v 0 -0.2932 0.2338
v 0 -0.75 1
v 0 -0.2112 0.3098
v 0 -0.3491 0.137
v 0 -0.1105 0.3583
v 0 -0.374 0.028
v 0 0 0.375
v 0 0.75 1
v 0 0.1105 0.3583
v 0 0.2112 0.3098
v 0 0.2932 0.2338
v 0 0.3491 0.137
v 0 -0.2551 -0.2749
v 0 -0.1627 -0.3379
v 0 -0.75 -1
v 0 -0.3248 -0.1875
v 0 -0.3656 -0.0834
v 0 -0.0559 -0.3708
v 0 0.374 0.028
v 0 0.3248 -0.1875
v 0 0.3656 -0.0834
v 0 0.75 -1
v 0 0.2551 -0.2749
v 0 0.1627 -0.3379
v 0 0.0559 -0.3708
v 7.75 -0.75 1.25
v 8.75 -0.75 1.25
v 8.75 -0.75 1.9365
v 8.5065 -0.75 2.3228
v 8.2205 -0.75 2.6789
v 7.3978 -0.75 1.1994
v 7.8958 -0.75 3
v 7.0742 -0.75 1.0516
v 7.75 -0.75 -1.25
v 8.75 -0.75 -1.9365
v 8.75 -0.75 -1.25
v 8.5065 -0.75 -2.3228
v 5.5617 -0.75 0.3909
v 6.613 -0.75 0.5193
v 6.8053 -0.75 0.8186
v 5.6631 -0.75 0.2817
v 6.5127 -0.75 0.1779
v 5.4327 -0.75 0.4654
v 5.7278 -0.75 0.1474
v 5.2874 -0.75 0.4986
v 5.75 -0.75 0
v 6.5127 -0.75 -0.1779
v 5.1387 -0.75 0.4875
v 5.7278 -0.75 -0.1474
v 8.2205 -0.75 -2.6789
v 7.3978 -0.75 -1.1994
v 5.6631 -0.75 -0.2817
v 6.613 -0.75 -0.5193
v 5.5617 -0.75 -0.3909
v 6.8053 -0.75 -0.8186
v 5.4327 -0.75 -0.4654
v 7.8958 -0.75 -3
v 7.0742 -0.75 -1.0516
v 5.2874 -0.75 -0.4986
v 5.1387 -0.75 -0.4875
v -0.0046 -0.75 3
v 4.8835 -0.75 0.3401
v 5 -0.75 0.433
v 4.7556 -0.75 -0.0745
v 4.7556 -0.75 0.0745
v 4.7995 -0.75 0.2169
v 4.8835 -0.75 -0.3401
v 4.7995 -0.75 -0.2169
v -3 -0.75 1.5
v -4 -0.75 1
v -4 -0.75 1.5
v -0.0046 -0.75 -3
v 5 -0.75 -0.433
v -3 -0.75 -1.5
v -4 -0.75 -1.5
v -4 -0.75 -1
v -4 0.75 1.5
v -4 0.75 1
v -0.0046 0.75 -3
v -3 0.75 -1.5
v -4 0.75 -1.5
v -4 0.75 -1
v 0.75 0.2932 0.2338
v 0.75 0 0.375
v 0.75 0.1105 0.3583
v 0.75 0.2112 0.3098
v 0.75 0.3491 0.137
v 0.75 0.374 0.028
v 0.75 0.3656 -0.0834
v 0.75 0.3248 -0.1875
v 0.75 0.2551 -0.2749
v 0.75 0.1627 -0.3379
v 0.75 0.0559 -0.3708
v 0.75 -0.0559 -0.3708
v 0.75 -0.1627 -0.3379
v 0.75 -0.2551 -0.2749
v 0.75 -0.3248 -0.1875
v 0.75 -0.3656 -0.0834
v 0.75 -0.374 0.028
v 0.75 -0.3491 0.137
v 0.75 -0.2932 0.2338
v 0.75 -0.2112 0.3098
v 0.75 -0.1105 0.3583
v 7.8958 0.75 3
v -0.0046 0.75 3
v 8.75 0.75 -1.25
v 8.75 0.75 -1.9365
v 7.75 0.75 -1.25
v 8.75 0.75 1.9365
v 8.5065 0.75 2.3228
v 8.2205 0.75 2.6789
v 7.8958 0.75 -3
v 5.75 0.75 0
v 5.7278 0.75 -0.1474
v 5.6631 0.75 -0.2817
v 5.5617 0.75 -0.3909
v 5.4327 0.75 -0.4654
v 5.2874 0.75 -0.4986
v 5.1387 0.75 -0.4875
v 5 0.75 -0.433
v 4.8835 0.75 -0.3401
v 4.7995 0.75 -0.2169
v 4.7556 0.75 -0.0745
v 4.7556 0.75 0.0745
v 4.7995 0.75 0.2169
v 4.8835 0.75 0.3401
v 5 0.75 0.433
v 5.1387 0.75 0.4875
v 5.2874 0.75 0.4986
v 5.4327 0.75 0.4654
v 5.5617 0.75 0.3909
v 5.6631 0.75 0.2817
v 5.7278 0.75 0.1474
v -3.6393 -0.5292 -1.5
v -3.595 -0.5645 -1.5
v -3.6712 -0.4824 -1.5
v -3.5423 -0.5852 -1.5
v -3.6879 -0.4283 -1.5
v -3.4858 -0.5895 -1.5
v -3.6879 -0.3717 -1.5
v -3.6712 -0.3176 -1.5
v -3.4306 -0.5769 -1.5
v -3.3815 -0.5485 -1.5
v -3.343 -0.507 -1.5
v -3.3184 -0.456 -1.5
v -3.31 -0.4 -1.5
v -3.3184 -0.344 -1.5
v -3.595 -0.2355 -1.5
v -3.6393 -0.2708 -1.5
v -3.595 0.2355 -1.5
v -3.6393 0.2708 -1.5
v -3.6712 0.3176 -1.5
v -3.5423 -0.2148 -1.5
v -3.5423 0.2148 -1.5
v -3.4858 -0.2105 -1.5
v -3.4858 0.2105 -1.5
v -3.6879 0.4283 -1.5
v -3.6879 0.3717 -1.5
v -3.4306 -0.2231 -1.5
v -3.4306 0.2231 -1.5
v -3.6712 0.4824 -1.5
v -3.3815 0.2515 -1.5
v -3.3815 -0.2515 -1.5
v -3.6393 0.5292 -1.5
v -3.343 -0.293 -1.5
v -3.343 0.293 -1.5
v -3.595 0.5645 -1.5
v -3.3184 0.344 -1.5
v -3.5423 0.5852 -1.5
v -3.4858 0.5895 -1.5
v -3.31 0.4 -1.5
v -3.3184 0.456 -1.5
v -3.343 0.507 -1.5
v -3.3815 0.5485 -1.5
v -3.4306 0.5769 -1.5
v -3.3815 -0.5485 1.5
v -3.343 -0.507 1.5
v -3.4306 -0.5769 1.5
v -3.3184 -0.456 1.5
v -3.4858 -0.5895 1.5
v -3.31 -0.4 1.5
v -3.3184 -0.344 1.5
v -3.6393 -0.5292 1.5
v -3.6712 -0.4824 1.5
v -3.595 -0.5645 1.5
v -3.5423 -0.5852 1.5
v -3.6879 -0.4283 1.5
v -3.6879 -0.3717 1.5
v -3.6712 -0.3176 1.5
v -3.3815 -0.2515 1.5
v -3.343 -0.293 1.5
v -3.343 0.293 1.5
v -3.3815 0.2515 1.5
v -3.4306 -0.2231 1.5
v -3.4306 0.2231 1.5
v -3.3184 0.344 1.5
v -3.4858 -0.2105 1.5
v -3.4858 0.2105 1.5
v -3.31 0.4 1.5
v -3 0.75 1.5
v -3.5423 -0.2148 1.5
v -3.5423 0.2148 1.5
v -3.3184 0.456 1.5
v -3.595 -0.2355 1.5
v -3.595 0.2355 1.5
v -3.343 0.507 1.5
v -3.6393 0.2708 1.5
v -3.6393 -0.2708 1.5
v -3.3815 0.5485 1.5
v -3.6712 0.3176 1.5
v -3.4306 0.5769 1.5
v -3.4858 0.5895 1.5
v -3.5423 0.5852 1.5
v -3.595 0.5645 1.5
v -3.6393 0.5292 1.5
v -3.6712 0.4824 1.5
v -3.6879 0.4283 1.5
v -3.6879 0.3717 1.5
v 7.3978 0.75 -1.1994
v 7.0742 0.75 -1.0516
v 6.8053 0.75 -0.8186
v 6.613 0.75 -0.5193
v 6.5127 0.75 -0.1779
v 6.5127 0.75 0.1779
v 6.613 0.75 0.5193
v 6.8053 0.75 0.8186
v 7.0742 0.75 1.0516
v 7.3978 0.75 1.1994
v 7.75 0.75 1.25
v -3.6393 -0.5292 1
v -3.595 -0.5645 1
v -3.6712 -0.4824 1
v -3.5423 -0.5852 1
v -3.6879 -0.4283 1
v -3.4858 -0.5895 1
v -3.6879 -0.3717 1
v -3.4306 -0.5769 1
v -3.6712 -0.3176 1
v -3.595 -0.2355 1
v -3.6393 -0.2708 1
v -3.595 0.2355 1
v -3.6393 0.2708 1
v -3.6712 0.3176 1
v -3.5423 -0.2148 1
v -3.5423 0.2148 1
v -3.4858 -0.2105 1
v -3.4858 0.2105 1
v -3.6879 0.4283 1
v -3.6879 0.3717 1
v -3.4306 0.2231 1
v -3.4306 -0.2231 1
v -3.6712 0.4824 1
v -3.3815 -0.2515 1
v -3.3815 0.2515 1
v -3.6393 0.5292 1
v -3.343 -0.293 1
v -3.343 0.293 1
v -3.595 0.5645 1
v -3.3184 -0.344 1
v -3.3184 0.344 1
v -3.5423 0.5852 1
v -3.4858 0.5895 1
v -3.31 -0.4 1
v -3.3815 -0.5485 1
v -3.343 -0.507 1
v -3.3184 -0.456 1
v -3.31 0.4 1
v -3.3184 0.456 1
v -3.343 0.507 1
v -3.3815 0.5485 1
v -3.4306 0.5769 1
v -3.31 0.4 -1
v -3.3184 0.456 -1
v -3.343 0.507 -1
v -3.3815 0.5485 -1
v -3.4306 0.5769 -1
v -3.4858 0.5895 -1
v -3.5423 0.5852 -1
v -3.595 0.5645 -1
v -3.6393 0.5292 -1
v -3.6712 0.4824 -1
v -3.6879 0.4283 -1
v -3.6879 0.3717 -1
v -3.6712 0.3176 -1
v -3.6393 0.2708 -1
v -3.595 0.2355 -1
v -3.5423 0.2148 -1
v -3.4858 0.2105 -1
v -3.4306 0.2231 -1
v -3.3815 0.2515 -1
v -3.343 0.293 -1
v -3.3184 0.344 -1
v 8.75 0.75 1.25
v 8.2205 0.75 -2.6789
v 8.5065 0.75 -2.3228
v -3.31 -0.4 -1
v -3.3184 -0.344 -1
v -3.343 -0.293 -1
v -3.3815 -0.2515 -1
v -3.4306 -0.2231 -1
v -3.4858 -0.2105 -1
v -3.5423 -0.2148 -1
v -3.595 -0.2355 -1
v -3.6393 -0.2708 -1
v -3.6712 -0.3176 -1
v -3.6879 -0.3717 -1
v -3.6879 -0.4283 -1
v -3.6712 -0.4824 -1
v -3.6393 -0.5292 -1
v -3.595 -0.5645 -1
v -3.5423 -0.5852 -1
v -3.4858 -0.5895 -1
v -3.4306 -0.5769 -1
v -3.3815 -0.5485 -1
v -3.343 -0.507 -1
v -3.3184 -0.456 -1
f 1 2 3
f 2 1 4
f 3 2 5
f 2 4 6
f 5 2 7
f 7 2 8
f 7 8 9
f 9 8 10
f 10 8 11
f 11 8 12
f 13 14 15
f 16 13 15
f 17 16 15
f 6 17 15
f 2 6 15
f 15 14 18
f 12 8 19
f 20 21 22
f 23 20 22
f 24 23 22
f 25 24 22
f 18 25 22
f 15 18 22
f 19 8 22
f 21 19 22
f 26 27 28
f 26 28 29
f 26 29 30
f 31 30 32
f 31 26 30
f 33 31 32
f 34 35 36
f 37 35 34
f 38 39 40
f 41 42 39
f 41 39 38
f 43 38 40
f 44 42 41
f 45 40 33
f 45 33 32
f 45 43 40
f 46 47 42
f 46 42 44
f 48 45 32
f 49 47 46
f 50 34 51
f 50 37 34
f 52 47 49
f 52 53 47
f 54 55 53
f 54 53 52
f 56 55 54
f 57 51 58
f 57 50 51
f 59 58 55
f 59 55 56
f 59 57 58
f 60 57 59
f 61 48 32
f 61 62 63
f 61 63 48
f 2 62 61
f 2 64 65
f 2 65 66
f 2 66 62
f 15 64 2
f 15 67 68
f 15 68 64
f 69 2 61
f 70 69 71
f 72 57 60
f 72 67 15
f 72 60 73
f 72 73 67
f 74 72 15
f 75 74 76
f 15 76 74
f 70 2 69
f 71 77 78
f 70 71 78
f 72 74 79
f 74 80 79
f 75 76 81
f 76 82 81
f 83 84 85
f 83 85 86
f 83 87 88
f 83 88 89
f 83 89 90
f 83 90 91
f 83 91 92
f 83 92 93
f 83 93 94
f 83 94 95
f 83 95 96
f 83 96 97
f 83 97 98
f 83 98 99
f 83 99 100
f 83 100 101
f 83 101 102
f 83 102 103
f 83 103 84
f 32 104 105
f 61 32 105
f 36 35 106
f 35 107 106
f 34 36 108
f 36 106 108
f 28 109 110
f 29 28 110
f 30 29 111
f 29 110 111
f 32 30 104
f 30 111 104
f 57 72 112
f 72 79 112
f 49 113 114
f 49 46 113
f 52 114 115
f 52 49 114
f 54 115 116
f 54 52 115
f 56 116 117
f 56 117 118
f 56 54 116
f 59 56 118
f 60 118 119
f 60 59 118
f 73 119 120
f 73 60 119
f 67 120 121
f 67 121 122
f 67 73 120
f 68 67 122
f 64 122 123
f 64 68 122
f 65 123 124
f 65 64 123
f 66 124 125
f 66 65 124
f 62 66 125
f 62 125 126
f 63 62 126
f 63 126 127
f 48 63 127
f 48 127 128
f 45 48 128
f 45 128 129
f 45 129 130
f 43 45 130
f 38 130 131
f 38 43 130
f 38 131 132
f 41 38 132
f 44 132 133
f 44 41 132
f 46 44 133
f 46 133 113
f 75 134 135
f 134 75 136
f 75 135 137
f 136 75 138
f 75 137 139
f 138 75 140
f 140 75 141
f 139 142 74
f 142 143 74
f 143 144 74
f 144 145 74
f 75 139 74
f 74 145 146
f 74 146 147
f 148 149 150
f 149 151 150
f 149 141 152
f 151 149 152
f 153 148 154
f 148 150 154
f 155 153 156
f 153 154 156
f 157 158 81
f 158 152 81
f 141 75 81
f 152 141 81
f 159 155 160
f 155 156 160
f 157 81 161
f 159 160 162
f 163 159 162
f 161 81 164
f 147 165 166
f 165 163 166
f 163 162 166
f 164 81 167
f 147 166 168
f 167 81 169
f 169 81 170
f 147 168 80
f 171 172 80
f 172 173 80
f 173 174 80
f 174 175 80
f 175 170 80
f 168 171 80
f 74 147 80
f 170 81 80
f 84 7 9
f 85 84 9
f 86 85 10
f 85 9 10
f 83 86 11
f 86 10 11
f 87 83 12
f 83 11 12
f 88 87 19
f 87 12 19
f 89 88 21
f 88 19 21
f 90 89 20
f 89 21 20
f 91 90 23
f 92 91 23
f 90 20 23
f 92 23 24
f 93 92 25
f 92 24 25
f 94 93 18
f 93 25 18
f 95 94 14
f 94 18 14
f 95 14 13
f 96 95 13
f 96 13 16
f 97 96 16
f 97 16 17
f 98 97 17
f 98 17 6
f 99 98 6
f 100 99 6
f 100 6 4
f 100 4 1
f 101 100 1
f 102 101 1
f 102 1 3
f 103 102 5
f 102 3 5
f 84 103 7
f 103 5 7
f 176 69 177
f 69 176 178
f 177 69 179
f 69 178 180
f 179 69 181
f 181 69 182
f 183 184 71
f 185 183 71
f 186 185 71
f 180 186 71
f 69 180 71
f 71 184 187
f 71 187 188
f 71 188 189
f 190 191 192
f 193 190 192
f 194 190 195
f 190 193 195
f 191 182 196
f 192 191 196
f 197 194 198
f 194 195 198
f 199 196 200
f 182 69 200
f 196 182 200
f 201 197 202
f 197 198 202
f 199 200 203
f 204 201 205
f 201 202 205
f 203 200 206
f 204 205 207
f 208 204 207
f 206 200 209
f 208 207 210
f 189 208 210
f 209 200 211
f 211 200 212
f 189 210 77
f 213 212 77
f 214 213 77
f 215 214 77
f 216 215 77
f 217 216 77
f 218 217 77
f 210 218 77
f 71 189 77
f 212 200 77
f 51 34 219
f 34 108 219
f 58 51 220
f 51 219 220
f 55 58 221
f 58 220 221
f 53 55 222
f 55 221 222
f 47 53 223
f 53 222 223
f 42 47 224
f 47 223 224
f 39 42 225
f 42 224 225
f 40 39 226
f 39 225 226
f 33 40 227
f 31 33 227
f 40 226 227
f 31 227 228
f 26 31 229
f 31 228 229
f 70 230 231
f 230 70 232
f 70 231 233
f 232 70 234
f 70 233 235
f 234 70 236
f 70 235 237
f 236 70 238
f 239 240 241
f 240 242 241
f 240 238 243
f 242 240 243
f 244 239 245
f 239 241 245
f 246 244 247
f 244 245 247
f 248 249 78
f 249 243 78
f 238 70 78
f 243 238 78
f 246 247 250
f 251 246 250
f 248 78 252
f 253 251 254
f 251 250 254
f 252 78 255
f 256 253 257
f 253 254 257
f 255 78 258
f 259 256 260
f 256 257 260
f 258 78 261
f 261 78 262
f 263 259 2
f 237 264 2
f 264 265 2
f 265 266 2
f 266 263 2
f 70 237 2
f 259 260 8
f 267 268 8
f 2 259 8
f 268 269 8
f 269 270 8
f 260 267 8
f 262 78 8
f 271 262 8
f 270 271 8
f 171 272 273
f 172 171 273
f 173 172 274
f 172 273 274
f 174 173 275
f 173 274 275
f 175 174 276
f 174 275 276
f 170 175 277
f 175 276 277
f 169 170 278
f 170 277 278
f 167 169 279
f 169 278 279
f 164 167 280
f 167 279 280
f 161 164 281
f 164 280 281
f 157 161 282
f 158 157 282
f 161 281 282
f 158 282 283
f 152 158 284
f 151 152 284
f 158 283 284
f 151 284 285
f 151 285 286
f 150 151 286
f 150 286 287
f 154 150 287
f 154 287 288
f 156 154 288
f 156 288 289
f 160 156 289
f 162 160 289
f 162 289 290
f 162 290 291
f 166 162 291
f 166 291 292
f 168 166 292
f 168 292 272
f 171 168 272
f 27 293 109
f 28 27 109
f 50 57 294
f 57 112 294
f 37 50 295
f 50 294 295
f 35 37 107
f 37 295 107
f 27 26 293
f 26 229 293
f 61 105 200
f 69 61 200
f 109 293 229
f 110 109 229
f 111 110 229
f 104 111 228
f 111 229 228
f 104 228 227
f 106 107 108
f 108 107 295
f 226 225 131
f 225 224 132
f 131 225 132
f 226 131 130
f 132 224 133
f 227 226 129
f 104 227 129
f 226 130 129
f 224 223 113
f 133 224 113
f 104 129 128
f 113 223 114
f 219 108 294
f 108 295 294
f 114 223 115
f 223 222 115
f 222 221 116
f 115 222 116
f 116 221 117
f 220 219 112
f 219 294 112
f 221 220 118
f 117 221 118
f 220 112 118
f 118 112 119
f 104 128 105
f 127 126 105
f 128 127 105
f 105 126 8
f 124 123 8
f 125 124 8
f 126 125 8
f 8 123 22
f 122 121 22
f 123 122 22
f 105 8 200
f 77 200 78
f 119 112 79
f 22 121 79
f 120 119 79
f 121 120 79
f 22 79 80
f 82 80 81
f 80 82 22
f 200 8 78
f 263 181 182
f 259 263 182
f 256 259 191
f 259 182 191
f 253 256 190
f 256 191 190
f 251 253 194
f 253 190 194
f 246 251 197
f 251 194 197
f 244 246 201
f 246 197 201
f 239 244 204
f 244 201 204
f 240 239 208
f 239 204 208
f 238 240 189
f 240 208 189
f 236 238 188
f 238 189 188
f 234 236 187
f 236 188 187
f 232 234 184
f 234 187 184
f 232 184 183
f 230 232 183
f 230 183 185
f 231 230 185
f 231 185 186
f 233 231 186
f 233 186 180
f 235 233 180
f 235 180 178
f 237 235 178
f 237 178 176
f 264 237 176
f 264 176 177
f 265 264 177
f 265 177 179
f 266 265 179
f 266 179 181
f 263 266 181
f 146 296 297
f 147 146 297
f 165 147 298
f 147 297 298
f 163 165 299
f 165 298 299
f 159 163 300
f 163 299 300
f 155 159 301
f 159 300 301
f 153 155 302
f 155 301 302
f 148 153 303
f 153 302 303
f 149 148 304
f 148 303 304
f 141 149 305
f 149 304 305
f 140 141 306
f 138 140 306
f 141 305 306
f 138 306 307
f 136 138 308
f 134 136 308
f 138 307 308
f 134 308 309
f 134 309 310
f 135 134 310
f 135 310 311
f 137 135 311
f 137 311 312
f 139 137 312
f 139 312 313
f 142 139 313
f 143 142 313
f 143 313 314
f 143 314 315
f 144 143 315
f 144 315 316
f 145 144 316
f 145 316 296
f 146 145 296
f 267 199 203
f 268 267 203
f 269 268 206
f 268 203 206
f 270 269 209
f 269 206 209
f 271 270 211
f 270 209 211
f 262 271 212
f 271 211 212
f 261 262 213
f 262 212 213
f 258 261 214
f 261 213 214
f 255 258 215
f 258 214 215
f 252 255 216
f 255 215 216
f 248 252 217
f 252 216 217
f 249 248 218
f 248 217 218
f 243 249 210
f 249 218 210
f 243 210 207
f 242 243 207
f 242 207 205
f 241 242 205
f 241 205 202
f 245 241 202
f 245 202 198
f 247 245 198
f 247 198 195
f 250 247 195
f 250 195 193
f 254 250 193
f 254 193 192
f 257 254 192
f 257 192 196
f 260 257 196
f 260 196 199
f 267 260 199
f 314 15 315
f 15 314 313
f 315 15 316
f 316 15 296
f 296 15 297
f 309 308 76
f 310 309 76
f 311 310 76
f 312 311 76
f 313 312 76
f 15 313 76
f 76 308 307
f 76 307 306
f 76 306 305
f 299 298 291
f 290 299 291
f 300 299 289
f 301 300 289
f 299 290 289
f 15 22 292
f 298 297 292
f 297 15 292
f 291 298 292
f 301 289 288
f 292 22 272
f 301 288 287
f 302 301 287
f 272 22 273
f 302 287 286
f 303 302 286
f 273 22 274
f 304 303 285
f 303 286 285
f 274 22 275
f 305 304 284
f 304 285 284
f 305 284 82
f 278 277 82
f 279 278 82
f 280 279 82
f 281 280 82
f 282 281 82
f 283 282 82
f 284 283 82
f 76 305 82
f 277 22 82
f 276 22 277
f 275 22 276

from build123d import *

# Parameters (mm, degrees)
SKETCH1_R           = 0.5
BOSS_EXTRUDE1_DEPTH = 0.75
SKETCH2_R           = 0.19
CUT_EXTRUDE1_DEPTH  = 5.5
SKETCH3_R           = 0.375
CUT_EXTRUDE2_DEPTH  = 0.75


with BuildPart() as part:
    # Sketch1 → Boss-Extrude1 (new body, symmetric)
    with BuildSketch(Plane(origin=(0, 0, 0), x_dir=(1, 0, 0), z_dir=(0, 1, 0))):
        with BuildLine():
            Line((0, 1), (-4, 1))
            Line((-4, 1), (-4, 1.5))
            Line((-4, 1.5), (-3, 1.5))
            Line((-3, 1.5), (-0.00458684, 3))
            Line((-0.00458684, 3), (7.895751311, 3))
            ThreePointArc((7.895751311, 3), (8.3685457, 2.504929683), (8.75, 1.936491673))
            Line((8.75, 1.936491673), (8.75, 1.25))
            Line((8.75, 1.25), (7.75, 1.25))
            ThreePointArc((7.75, 1.25), (6.5, 0), (7.75, -1.25))
            Line((7.75, -1.25), (8.75, -1.25))
            Line((8.75, -1.25), (8.75, -1.936491673))
            ThreePointArc((8.75, -1.936491673), (8.3685457, -2.504929683), (7.895751311, -3))
            Line((7.895751311, -3), (-0.00458684, -3))
            Line((-0.00458684, -3), (-3, -1.5))
            Line((-3, -1.5), (-4, -1.5))
            Line((-4, -1.5), (-4, -1))
            Line((-4, -1), (0, -1))
            Line((0, -1), (0, 1))
        make_face()
        with Locations((5.25, 0)):
            Circle(SKETCH1_R, mode=Mode.SUBTRACT)
    extrude(amount=BOSS_EXTRUDE1_DEPTH, both=True)

    # Sketch2 → Cut-Extrude1 (cut, through all)
    with BuildSketch(Plane.XY.offset(1.5)):
        with Locations((-3.5, 0.4)):
            Circle(SKETCH2_R)
        with Locations((-3.5, -0.4)):
            Circle(SKETCH2_R)
    extrude(amount=-CUT_EXTRUDE1_DEPTH, mode=Mode.SUBTRACT)

    # Sketch3 → Cut-Extrude2 (cut)
    with BuildSketch(Plane.ZY):
        Circle(SKETCH3_R)
    extrude(amount=-CUT_EXTRUDE2_DEPTH, mode=Mode.SUBTRACT)


solid = part.part
